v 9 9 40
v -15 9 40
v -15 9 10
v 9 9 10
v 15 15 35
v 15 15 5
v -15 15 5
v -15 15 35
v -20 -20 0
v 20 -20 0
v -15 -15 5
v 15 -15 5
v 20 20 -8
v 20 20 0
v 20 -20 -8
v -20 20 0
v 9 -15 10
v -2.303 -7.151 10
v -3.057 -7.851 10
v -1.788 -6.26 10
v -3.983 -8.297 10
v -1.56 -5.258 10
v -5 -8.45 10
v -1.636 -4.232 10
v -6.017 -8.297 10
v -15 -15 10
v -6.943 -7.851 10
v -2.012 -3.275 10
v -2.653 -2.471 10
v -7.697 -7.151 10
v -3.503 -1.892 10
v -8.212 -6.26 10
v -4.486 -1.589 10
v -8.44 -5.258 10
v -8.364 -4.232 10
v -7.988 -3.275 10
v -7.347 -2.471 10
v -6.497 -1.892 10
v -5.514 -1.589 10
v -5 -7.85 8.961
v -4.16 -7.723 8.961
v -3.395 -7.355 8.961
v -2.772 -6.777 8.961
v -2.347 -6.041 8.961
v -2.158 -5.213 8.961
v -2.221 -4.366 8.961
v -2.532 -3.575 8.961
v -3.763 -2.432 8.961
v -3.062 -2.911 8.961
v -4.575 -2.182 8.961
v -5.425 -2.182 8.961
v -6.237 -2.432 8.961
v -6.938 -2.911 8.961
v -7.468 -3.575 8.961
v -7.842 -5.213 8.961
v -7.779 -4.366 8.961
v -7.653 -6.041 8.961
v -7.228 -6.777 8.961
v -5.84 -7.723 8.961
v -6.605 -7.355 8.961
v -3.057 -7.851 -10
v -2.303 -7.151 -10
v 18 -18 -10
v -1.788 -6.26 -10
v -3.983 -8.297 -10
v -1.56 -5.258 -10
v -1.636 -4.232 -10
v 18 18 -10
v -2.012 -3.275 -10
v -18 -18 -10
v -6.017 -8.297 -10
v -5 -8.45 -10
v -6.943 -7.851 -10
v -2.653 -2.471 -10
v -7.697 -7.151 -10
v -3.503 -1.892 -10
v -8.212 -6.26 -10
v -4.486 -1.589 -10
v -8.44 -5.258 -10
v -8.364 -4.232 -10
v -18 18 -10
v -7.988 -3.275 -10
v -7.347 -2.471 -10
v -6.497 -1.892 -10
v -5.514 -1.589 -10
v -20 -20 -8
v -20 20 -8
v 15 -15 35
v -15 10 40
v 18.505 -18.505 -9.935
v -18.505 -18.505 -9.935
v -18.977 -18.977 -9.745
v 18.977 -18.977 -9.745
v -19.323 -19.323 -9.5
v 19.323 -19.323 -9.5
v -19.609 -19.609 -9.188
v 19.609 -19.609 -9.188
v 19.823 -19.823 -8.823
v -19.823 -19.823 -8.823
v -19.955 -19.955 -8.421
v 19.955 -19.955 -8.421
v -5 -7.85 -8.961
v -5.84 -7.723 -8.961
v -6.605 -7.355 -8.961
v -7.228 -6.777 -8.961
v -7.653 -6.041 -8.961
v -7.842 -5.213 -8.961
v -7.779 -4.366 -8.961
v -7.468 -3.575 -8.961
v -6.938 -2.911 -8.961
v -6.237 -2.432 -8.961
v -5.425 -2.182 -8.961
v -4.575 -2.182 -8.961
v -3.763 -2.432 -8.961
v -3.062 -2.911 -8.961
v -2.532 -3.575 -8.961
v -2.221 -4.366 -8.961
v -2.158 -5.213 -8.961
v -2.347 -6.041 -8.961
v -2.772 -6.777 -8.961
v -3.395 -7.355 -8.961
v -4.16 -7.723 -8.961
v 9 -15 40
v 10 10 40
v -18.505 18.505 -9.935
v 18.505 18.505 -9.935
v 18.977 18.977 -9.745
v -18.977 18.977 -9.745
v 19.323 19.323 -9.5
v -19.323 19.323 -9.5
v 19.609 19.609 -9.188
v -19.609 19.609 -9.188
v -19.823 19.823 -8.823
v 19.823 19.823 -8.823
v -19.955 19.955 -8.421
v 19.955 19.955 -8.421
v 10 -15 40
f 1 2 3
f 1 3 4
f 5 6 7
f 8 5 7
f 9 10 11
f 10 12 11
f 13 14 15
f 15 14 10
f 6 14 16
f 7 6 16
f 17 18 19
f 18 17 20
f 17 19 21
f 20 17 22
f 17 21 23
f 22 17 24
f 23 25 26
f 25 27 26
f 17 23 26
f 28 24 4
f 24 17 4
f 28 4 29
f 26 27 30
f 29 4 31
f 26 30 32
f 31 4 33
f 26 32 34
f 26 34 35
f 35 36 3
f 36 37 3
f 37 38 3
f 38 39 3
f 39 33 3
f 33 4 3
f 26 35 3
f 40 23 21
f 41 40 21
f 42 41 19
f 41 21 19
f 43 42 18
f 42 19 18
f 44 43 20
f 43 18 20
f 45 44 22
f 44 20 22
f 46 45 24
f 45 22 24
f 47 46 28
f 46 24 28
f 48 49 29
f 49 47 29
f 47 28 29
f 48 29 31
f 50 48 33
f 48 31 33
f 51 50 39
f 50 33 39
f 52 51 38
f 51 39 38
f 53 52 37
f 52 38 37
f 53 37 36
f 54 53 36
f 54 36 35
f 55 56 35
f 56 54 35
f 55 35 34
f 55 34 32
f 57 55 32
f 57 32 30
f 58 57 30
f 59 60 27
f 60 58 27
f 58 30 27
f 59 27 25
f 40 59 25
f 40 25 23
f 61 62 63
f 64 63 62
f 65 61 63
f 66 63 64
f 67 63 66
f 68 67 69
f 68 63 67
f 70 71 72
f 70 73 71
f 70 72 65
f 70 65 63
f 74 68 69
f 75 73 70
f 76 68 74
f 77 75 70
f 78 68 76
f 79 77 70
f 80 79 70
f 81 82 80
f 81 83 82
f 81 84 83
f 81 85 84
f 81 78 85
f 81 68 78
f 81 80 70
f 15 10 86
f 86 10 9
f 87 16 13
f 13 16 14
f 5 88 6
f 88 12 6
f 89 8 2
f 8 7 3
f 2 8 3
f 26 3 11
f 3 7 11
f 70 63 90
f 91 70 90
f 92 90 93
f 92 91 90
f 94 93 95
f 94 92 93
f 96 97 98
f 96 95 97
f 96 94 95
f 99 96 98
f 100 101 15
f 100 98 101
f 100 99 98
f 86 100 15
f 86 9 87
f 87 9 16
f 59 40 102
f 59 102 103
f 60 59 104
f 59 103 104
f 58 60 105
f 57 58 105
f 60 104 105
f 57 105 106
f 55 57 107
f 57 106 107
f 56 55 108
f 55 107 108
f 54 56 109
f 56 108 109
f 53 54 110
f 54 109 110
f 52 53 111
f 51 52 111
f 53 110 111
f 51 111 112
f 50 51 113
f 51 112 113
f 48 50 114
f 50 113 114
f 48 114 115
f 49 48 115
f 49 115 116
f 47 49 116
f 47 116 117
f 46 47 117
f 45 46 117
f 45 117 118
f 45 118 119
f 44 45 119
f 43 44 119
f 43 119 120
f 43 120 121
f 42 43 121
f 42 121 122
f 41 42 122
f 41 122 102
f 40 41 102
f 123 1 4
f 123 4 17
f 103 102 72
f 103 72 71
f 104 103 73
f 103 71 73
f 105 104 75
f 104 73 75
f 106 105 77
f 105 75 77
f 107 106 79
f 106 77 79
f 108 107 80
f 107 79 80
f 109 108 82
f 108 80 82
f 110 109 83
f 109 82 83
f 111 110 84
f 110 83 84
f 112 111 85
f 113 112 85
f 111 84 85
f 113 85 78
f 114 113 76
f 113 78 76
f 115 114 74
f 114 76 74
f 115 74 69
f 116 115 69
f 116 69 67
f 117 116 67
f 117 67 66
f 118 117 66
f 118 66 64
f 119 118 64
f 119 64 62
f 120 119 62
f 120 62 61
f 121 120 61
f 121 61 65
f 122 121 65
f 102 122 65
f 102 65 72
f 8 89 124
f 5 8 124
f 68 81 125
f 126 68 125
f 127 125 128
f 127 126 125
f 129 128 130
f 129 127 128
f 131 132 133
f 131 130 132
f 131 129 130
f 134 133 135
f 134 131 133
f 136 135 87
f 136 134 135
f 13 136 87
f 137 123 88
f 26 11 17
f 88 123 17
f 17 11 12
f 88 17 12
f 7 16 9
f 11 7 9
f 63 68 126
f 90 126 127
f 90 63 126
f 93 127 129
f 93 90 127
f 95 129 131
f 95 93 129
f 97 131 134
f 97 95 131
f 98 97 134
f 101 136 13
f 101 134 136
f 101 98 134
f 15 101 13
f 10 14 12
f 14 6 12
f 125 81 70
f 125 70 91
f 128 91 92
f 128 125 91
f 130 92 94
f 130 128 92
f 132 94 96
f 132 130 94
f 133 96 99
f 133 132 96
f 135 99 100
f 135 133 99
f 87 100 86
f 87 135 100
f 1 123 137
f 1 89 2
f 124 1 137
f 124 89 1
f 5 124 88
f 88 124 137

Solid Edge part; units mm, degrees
sketch "Sketch1" plane through (0, 0, 0) normal (0, 0, 1) x (1, 0, 0)
  line L0 (-15, -15) -> (15, -15)
  line L1 (15, -15) -> (15, 15)
  line L2 (15, 15) -> (-15, 15)
  line L3 (-15, 15) -> (-15, -15)
  dimension "D1" = 30
extrude "Protrusion1" add sketch "Sketch1" along normal blind 40
sketch "Sketch2" plane through (0, 0, 0) normal (0, 0, -1) x (0, 1, 0)
  line L0 (-20, -20) -> (20, -20)
  line L1 (20, -20) -> (20, 20)
  line L2 (20, 20) -> (-20, 20)
  line L3 (-20, 20) -> (-20, -20)
  dimension "D1" = 40
extrude "ExtrudedProtrusion_2" add sketch "Sketch2" along normal blind 10
sketch "Sketch3" plane through (0, 0, 40) normal (0, 0, 1) x (1, 0, 0)
  line L0 (-15, 9) -> (9, 9)
  line L1 (9, 9) -> (9, -15)
  line L2 (9, -15) -> (-15, -15)
  line L3 (-15, -15) -> (-15, 9)
  dimension "D1" = 24
extrude "ExtrudedCutout_1" cut sketch "Sketch3" against normal blind 30
chamfer "Chamfer_1" distance 5 angle 45 2 edges at (15, 0, 40) (0, 15, 40)
chamfer "Chamfer_2" distance 5 angle 45 4 edges at (15, 0, 0) (0, 15, 0) (-15, 0, 0) (0, -15, 0)
fillet "Round_1" radius 2 4 edges at (-20, 0, -10) (0, 20, -10) (0, -20, -10) (20, 0, -10)
hole "Hole_1" at (-5, -5, 10) direction (0, 0, -1) diameter 5.7 depth 40 tip angle 118 start chamfer 0.6 start chamfer angle 30 end chamfer 0.6 end chamfer angle 30
properties material "Polyethylene, low density"
